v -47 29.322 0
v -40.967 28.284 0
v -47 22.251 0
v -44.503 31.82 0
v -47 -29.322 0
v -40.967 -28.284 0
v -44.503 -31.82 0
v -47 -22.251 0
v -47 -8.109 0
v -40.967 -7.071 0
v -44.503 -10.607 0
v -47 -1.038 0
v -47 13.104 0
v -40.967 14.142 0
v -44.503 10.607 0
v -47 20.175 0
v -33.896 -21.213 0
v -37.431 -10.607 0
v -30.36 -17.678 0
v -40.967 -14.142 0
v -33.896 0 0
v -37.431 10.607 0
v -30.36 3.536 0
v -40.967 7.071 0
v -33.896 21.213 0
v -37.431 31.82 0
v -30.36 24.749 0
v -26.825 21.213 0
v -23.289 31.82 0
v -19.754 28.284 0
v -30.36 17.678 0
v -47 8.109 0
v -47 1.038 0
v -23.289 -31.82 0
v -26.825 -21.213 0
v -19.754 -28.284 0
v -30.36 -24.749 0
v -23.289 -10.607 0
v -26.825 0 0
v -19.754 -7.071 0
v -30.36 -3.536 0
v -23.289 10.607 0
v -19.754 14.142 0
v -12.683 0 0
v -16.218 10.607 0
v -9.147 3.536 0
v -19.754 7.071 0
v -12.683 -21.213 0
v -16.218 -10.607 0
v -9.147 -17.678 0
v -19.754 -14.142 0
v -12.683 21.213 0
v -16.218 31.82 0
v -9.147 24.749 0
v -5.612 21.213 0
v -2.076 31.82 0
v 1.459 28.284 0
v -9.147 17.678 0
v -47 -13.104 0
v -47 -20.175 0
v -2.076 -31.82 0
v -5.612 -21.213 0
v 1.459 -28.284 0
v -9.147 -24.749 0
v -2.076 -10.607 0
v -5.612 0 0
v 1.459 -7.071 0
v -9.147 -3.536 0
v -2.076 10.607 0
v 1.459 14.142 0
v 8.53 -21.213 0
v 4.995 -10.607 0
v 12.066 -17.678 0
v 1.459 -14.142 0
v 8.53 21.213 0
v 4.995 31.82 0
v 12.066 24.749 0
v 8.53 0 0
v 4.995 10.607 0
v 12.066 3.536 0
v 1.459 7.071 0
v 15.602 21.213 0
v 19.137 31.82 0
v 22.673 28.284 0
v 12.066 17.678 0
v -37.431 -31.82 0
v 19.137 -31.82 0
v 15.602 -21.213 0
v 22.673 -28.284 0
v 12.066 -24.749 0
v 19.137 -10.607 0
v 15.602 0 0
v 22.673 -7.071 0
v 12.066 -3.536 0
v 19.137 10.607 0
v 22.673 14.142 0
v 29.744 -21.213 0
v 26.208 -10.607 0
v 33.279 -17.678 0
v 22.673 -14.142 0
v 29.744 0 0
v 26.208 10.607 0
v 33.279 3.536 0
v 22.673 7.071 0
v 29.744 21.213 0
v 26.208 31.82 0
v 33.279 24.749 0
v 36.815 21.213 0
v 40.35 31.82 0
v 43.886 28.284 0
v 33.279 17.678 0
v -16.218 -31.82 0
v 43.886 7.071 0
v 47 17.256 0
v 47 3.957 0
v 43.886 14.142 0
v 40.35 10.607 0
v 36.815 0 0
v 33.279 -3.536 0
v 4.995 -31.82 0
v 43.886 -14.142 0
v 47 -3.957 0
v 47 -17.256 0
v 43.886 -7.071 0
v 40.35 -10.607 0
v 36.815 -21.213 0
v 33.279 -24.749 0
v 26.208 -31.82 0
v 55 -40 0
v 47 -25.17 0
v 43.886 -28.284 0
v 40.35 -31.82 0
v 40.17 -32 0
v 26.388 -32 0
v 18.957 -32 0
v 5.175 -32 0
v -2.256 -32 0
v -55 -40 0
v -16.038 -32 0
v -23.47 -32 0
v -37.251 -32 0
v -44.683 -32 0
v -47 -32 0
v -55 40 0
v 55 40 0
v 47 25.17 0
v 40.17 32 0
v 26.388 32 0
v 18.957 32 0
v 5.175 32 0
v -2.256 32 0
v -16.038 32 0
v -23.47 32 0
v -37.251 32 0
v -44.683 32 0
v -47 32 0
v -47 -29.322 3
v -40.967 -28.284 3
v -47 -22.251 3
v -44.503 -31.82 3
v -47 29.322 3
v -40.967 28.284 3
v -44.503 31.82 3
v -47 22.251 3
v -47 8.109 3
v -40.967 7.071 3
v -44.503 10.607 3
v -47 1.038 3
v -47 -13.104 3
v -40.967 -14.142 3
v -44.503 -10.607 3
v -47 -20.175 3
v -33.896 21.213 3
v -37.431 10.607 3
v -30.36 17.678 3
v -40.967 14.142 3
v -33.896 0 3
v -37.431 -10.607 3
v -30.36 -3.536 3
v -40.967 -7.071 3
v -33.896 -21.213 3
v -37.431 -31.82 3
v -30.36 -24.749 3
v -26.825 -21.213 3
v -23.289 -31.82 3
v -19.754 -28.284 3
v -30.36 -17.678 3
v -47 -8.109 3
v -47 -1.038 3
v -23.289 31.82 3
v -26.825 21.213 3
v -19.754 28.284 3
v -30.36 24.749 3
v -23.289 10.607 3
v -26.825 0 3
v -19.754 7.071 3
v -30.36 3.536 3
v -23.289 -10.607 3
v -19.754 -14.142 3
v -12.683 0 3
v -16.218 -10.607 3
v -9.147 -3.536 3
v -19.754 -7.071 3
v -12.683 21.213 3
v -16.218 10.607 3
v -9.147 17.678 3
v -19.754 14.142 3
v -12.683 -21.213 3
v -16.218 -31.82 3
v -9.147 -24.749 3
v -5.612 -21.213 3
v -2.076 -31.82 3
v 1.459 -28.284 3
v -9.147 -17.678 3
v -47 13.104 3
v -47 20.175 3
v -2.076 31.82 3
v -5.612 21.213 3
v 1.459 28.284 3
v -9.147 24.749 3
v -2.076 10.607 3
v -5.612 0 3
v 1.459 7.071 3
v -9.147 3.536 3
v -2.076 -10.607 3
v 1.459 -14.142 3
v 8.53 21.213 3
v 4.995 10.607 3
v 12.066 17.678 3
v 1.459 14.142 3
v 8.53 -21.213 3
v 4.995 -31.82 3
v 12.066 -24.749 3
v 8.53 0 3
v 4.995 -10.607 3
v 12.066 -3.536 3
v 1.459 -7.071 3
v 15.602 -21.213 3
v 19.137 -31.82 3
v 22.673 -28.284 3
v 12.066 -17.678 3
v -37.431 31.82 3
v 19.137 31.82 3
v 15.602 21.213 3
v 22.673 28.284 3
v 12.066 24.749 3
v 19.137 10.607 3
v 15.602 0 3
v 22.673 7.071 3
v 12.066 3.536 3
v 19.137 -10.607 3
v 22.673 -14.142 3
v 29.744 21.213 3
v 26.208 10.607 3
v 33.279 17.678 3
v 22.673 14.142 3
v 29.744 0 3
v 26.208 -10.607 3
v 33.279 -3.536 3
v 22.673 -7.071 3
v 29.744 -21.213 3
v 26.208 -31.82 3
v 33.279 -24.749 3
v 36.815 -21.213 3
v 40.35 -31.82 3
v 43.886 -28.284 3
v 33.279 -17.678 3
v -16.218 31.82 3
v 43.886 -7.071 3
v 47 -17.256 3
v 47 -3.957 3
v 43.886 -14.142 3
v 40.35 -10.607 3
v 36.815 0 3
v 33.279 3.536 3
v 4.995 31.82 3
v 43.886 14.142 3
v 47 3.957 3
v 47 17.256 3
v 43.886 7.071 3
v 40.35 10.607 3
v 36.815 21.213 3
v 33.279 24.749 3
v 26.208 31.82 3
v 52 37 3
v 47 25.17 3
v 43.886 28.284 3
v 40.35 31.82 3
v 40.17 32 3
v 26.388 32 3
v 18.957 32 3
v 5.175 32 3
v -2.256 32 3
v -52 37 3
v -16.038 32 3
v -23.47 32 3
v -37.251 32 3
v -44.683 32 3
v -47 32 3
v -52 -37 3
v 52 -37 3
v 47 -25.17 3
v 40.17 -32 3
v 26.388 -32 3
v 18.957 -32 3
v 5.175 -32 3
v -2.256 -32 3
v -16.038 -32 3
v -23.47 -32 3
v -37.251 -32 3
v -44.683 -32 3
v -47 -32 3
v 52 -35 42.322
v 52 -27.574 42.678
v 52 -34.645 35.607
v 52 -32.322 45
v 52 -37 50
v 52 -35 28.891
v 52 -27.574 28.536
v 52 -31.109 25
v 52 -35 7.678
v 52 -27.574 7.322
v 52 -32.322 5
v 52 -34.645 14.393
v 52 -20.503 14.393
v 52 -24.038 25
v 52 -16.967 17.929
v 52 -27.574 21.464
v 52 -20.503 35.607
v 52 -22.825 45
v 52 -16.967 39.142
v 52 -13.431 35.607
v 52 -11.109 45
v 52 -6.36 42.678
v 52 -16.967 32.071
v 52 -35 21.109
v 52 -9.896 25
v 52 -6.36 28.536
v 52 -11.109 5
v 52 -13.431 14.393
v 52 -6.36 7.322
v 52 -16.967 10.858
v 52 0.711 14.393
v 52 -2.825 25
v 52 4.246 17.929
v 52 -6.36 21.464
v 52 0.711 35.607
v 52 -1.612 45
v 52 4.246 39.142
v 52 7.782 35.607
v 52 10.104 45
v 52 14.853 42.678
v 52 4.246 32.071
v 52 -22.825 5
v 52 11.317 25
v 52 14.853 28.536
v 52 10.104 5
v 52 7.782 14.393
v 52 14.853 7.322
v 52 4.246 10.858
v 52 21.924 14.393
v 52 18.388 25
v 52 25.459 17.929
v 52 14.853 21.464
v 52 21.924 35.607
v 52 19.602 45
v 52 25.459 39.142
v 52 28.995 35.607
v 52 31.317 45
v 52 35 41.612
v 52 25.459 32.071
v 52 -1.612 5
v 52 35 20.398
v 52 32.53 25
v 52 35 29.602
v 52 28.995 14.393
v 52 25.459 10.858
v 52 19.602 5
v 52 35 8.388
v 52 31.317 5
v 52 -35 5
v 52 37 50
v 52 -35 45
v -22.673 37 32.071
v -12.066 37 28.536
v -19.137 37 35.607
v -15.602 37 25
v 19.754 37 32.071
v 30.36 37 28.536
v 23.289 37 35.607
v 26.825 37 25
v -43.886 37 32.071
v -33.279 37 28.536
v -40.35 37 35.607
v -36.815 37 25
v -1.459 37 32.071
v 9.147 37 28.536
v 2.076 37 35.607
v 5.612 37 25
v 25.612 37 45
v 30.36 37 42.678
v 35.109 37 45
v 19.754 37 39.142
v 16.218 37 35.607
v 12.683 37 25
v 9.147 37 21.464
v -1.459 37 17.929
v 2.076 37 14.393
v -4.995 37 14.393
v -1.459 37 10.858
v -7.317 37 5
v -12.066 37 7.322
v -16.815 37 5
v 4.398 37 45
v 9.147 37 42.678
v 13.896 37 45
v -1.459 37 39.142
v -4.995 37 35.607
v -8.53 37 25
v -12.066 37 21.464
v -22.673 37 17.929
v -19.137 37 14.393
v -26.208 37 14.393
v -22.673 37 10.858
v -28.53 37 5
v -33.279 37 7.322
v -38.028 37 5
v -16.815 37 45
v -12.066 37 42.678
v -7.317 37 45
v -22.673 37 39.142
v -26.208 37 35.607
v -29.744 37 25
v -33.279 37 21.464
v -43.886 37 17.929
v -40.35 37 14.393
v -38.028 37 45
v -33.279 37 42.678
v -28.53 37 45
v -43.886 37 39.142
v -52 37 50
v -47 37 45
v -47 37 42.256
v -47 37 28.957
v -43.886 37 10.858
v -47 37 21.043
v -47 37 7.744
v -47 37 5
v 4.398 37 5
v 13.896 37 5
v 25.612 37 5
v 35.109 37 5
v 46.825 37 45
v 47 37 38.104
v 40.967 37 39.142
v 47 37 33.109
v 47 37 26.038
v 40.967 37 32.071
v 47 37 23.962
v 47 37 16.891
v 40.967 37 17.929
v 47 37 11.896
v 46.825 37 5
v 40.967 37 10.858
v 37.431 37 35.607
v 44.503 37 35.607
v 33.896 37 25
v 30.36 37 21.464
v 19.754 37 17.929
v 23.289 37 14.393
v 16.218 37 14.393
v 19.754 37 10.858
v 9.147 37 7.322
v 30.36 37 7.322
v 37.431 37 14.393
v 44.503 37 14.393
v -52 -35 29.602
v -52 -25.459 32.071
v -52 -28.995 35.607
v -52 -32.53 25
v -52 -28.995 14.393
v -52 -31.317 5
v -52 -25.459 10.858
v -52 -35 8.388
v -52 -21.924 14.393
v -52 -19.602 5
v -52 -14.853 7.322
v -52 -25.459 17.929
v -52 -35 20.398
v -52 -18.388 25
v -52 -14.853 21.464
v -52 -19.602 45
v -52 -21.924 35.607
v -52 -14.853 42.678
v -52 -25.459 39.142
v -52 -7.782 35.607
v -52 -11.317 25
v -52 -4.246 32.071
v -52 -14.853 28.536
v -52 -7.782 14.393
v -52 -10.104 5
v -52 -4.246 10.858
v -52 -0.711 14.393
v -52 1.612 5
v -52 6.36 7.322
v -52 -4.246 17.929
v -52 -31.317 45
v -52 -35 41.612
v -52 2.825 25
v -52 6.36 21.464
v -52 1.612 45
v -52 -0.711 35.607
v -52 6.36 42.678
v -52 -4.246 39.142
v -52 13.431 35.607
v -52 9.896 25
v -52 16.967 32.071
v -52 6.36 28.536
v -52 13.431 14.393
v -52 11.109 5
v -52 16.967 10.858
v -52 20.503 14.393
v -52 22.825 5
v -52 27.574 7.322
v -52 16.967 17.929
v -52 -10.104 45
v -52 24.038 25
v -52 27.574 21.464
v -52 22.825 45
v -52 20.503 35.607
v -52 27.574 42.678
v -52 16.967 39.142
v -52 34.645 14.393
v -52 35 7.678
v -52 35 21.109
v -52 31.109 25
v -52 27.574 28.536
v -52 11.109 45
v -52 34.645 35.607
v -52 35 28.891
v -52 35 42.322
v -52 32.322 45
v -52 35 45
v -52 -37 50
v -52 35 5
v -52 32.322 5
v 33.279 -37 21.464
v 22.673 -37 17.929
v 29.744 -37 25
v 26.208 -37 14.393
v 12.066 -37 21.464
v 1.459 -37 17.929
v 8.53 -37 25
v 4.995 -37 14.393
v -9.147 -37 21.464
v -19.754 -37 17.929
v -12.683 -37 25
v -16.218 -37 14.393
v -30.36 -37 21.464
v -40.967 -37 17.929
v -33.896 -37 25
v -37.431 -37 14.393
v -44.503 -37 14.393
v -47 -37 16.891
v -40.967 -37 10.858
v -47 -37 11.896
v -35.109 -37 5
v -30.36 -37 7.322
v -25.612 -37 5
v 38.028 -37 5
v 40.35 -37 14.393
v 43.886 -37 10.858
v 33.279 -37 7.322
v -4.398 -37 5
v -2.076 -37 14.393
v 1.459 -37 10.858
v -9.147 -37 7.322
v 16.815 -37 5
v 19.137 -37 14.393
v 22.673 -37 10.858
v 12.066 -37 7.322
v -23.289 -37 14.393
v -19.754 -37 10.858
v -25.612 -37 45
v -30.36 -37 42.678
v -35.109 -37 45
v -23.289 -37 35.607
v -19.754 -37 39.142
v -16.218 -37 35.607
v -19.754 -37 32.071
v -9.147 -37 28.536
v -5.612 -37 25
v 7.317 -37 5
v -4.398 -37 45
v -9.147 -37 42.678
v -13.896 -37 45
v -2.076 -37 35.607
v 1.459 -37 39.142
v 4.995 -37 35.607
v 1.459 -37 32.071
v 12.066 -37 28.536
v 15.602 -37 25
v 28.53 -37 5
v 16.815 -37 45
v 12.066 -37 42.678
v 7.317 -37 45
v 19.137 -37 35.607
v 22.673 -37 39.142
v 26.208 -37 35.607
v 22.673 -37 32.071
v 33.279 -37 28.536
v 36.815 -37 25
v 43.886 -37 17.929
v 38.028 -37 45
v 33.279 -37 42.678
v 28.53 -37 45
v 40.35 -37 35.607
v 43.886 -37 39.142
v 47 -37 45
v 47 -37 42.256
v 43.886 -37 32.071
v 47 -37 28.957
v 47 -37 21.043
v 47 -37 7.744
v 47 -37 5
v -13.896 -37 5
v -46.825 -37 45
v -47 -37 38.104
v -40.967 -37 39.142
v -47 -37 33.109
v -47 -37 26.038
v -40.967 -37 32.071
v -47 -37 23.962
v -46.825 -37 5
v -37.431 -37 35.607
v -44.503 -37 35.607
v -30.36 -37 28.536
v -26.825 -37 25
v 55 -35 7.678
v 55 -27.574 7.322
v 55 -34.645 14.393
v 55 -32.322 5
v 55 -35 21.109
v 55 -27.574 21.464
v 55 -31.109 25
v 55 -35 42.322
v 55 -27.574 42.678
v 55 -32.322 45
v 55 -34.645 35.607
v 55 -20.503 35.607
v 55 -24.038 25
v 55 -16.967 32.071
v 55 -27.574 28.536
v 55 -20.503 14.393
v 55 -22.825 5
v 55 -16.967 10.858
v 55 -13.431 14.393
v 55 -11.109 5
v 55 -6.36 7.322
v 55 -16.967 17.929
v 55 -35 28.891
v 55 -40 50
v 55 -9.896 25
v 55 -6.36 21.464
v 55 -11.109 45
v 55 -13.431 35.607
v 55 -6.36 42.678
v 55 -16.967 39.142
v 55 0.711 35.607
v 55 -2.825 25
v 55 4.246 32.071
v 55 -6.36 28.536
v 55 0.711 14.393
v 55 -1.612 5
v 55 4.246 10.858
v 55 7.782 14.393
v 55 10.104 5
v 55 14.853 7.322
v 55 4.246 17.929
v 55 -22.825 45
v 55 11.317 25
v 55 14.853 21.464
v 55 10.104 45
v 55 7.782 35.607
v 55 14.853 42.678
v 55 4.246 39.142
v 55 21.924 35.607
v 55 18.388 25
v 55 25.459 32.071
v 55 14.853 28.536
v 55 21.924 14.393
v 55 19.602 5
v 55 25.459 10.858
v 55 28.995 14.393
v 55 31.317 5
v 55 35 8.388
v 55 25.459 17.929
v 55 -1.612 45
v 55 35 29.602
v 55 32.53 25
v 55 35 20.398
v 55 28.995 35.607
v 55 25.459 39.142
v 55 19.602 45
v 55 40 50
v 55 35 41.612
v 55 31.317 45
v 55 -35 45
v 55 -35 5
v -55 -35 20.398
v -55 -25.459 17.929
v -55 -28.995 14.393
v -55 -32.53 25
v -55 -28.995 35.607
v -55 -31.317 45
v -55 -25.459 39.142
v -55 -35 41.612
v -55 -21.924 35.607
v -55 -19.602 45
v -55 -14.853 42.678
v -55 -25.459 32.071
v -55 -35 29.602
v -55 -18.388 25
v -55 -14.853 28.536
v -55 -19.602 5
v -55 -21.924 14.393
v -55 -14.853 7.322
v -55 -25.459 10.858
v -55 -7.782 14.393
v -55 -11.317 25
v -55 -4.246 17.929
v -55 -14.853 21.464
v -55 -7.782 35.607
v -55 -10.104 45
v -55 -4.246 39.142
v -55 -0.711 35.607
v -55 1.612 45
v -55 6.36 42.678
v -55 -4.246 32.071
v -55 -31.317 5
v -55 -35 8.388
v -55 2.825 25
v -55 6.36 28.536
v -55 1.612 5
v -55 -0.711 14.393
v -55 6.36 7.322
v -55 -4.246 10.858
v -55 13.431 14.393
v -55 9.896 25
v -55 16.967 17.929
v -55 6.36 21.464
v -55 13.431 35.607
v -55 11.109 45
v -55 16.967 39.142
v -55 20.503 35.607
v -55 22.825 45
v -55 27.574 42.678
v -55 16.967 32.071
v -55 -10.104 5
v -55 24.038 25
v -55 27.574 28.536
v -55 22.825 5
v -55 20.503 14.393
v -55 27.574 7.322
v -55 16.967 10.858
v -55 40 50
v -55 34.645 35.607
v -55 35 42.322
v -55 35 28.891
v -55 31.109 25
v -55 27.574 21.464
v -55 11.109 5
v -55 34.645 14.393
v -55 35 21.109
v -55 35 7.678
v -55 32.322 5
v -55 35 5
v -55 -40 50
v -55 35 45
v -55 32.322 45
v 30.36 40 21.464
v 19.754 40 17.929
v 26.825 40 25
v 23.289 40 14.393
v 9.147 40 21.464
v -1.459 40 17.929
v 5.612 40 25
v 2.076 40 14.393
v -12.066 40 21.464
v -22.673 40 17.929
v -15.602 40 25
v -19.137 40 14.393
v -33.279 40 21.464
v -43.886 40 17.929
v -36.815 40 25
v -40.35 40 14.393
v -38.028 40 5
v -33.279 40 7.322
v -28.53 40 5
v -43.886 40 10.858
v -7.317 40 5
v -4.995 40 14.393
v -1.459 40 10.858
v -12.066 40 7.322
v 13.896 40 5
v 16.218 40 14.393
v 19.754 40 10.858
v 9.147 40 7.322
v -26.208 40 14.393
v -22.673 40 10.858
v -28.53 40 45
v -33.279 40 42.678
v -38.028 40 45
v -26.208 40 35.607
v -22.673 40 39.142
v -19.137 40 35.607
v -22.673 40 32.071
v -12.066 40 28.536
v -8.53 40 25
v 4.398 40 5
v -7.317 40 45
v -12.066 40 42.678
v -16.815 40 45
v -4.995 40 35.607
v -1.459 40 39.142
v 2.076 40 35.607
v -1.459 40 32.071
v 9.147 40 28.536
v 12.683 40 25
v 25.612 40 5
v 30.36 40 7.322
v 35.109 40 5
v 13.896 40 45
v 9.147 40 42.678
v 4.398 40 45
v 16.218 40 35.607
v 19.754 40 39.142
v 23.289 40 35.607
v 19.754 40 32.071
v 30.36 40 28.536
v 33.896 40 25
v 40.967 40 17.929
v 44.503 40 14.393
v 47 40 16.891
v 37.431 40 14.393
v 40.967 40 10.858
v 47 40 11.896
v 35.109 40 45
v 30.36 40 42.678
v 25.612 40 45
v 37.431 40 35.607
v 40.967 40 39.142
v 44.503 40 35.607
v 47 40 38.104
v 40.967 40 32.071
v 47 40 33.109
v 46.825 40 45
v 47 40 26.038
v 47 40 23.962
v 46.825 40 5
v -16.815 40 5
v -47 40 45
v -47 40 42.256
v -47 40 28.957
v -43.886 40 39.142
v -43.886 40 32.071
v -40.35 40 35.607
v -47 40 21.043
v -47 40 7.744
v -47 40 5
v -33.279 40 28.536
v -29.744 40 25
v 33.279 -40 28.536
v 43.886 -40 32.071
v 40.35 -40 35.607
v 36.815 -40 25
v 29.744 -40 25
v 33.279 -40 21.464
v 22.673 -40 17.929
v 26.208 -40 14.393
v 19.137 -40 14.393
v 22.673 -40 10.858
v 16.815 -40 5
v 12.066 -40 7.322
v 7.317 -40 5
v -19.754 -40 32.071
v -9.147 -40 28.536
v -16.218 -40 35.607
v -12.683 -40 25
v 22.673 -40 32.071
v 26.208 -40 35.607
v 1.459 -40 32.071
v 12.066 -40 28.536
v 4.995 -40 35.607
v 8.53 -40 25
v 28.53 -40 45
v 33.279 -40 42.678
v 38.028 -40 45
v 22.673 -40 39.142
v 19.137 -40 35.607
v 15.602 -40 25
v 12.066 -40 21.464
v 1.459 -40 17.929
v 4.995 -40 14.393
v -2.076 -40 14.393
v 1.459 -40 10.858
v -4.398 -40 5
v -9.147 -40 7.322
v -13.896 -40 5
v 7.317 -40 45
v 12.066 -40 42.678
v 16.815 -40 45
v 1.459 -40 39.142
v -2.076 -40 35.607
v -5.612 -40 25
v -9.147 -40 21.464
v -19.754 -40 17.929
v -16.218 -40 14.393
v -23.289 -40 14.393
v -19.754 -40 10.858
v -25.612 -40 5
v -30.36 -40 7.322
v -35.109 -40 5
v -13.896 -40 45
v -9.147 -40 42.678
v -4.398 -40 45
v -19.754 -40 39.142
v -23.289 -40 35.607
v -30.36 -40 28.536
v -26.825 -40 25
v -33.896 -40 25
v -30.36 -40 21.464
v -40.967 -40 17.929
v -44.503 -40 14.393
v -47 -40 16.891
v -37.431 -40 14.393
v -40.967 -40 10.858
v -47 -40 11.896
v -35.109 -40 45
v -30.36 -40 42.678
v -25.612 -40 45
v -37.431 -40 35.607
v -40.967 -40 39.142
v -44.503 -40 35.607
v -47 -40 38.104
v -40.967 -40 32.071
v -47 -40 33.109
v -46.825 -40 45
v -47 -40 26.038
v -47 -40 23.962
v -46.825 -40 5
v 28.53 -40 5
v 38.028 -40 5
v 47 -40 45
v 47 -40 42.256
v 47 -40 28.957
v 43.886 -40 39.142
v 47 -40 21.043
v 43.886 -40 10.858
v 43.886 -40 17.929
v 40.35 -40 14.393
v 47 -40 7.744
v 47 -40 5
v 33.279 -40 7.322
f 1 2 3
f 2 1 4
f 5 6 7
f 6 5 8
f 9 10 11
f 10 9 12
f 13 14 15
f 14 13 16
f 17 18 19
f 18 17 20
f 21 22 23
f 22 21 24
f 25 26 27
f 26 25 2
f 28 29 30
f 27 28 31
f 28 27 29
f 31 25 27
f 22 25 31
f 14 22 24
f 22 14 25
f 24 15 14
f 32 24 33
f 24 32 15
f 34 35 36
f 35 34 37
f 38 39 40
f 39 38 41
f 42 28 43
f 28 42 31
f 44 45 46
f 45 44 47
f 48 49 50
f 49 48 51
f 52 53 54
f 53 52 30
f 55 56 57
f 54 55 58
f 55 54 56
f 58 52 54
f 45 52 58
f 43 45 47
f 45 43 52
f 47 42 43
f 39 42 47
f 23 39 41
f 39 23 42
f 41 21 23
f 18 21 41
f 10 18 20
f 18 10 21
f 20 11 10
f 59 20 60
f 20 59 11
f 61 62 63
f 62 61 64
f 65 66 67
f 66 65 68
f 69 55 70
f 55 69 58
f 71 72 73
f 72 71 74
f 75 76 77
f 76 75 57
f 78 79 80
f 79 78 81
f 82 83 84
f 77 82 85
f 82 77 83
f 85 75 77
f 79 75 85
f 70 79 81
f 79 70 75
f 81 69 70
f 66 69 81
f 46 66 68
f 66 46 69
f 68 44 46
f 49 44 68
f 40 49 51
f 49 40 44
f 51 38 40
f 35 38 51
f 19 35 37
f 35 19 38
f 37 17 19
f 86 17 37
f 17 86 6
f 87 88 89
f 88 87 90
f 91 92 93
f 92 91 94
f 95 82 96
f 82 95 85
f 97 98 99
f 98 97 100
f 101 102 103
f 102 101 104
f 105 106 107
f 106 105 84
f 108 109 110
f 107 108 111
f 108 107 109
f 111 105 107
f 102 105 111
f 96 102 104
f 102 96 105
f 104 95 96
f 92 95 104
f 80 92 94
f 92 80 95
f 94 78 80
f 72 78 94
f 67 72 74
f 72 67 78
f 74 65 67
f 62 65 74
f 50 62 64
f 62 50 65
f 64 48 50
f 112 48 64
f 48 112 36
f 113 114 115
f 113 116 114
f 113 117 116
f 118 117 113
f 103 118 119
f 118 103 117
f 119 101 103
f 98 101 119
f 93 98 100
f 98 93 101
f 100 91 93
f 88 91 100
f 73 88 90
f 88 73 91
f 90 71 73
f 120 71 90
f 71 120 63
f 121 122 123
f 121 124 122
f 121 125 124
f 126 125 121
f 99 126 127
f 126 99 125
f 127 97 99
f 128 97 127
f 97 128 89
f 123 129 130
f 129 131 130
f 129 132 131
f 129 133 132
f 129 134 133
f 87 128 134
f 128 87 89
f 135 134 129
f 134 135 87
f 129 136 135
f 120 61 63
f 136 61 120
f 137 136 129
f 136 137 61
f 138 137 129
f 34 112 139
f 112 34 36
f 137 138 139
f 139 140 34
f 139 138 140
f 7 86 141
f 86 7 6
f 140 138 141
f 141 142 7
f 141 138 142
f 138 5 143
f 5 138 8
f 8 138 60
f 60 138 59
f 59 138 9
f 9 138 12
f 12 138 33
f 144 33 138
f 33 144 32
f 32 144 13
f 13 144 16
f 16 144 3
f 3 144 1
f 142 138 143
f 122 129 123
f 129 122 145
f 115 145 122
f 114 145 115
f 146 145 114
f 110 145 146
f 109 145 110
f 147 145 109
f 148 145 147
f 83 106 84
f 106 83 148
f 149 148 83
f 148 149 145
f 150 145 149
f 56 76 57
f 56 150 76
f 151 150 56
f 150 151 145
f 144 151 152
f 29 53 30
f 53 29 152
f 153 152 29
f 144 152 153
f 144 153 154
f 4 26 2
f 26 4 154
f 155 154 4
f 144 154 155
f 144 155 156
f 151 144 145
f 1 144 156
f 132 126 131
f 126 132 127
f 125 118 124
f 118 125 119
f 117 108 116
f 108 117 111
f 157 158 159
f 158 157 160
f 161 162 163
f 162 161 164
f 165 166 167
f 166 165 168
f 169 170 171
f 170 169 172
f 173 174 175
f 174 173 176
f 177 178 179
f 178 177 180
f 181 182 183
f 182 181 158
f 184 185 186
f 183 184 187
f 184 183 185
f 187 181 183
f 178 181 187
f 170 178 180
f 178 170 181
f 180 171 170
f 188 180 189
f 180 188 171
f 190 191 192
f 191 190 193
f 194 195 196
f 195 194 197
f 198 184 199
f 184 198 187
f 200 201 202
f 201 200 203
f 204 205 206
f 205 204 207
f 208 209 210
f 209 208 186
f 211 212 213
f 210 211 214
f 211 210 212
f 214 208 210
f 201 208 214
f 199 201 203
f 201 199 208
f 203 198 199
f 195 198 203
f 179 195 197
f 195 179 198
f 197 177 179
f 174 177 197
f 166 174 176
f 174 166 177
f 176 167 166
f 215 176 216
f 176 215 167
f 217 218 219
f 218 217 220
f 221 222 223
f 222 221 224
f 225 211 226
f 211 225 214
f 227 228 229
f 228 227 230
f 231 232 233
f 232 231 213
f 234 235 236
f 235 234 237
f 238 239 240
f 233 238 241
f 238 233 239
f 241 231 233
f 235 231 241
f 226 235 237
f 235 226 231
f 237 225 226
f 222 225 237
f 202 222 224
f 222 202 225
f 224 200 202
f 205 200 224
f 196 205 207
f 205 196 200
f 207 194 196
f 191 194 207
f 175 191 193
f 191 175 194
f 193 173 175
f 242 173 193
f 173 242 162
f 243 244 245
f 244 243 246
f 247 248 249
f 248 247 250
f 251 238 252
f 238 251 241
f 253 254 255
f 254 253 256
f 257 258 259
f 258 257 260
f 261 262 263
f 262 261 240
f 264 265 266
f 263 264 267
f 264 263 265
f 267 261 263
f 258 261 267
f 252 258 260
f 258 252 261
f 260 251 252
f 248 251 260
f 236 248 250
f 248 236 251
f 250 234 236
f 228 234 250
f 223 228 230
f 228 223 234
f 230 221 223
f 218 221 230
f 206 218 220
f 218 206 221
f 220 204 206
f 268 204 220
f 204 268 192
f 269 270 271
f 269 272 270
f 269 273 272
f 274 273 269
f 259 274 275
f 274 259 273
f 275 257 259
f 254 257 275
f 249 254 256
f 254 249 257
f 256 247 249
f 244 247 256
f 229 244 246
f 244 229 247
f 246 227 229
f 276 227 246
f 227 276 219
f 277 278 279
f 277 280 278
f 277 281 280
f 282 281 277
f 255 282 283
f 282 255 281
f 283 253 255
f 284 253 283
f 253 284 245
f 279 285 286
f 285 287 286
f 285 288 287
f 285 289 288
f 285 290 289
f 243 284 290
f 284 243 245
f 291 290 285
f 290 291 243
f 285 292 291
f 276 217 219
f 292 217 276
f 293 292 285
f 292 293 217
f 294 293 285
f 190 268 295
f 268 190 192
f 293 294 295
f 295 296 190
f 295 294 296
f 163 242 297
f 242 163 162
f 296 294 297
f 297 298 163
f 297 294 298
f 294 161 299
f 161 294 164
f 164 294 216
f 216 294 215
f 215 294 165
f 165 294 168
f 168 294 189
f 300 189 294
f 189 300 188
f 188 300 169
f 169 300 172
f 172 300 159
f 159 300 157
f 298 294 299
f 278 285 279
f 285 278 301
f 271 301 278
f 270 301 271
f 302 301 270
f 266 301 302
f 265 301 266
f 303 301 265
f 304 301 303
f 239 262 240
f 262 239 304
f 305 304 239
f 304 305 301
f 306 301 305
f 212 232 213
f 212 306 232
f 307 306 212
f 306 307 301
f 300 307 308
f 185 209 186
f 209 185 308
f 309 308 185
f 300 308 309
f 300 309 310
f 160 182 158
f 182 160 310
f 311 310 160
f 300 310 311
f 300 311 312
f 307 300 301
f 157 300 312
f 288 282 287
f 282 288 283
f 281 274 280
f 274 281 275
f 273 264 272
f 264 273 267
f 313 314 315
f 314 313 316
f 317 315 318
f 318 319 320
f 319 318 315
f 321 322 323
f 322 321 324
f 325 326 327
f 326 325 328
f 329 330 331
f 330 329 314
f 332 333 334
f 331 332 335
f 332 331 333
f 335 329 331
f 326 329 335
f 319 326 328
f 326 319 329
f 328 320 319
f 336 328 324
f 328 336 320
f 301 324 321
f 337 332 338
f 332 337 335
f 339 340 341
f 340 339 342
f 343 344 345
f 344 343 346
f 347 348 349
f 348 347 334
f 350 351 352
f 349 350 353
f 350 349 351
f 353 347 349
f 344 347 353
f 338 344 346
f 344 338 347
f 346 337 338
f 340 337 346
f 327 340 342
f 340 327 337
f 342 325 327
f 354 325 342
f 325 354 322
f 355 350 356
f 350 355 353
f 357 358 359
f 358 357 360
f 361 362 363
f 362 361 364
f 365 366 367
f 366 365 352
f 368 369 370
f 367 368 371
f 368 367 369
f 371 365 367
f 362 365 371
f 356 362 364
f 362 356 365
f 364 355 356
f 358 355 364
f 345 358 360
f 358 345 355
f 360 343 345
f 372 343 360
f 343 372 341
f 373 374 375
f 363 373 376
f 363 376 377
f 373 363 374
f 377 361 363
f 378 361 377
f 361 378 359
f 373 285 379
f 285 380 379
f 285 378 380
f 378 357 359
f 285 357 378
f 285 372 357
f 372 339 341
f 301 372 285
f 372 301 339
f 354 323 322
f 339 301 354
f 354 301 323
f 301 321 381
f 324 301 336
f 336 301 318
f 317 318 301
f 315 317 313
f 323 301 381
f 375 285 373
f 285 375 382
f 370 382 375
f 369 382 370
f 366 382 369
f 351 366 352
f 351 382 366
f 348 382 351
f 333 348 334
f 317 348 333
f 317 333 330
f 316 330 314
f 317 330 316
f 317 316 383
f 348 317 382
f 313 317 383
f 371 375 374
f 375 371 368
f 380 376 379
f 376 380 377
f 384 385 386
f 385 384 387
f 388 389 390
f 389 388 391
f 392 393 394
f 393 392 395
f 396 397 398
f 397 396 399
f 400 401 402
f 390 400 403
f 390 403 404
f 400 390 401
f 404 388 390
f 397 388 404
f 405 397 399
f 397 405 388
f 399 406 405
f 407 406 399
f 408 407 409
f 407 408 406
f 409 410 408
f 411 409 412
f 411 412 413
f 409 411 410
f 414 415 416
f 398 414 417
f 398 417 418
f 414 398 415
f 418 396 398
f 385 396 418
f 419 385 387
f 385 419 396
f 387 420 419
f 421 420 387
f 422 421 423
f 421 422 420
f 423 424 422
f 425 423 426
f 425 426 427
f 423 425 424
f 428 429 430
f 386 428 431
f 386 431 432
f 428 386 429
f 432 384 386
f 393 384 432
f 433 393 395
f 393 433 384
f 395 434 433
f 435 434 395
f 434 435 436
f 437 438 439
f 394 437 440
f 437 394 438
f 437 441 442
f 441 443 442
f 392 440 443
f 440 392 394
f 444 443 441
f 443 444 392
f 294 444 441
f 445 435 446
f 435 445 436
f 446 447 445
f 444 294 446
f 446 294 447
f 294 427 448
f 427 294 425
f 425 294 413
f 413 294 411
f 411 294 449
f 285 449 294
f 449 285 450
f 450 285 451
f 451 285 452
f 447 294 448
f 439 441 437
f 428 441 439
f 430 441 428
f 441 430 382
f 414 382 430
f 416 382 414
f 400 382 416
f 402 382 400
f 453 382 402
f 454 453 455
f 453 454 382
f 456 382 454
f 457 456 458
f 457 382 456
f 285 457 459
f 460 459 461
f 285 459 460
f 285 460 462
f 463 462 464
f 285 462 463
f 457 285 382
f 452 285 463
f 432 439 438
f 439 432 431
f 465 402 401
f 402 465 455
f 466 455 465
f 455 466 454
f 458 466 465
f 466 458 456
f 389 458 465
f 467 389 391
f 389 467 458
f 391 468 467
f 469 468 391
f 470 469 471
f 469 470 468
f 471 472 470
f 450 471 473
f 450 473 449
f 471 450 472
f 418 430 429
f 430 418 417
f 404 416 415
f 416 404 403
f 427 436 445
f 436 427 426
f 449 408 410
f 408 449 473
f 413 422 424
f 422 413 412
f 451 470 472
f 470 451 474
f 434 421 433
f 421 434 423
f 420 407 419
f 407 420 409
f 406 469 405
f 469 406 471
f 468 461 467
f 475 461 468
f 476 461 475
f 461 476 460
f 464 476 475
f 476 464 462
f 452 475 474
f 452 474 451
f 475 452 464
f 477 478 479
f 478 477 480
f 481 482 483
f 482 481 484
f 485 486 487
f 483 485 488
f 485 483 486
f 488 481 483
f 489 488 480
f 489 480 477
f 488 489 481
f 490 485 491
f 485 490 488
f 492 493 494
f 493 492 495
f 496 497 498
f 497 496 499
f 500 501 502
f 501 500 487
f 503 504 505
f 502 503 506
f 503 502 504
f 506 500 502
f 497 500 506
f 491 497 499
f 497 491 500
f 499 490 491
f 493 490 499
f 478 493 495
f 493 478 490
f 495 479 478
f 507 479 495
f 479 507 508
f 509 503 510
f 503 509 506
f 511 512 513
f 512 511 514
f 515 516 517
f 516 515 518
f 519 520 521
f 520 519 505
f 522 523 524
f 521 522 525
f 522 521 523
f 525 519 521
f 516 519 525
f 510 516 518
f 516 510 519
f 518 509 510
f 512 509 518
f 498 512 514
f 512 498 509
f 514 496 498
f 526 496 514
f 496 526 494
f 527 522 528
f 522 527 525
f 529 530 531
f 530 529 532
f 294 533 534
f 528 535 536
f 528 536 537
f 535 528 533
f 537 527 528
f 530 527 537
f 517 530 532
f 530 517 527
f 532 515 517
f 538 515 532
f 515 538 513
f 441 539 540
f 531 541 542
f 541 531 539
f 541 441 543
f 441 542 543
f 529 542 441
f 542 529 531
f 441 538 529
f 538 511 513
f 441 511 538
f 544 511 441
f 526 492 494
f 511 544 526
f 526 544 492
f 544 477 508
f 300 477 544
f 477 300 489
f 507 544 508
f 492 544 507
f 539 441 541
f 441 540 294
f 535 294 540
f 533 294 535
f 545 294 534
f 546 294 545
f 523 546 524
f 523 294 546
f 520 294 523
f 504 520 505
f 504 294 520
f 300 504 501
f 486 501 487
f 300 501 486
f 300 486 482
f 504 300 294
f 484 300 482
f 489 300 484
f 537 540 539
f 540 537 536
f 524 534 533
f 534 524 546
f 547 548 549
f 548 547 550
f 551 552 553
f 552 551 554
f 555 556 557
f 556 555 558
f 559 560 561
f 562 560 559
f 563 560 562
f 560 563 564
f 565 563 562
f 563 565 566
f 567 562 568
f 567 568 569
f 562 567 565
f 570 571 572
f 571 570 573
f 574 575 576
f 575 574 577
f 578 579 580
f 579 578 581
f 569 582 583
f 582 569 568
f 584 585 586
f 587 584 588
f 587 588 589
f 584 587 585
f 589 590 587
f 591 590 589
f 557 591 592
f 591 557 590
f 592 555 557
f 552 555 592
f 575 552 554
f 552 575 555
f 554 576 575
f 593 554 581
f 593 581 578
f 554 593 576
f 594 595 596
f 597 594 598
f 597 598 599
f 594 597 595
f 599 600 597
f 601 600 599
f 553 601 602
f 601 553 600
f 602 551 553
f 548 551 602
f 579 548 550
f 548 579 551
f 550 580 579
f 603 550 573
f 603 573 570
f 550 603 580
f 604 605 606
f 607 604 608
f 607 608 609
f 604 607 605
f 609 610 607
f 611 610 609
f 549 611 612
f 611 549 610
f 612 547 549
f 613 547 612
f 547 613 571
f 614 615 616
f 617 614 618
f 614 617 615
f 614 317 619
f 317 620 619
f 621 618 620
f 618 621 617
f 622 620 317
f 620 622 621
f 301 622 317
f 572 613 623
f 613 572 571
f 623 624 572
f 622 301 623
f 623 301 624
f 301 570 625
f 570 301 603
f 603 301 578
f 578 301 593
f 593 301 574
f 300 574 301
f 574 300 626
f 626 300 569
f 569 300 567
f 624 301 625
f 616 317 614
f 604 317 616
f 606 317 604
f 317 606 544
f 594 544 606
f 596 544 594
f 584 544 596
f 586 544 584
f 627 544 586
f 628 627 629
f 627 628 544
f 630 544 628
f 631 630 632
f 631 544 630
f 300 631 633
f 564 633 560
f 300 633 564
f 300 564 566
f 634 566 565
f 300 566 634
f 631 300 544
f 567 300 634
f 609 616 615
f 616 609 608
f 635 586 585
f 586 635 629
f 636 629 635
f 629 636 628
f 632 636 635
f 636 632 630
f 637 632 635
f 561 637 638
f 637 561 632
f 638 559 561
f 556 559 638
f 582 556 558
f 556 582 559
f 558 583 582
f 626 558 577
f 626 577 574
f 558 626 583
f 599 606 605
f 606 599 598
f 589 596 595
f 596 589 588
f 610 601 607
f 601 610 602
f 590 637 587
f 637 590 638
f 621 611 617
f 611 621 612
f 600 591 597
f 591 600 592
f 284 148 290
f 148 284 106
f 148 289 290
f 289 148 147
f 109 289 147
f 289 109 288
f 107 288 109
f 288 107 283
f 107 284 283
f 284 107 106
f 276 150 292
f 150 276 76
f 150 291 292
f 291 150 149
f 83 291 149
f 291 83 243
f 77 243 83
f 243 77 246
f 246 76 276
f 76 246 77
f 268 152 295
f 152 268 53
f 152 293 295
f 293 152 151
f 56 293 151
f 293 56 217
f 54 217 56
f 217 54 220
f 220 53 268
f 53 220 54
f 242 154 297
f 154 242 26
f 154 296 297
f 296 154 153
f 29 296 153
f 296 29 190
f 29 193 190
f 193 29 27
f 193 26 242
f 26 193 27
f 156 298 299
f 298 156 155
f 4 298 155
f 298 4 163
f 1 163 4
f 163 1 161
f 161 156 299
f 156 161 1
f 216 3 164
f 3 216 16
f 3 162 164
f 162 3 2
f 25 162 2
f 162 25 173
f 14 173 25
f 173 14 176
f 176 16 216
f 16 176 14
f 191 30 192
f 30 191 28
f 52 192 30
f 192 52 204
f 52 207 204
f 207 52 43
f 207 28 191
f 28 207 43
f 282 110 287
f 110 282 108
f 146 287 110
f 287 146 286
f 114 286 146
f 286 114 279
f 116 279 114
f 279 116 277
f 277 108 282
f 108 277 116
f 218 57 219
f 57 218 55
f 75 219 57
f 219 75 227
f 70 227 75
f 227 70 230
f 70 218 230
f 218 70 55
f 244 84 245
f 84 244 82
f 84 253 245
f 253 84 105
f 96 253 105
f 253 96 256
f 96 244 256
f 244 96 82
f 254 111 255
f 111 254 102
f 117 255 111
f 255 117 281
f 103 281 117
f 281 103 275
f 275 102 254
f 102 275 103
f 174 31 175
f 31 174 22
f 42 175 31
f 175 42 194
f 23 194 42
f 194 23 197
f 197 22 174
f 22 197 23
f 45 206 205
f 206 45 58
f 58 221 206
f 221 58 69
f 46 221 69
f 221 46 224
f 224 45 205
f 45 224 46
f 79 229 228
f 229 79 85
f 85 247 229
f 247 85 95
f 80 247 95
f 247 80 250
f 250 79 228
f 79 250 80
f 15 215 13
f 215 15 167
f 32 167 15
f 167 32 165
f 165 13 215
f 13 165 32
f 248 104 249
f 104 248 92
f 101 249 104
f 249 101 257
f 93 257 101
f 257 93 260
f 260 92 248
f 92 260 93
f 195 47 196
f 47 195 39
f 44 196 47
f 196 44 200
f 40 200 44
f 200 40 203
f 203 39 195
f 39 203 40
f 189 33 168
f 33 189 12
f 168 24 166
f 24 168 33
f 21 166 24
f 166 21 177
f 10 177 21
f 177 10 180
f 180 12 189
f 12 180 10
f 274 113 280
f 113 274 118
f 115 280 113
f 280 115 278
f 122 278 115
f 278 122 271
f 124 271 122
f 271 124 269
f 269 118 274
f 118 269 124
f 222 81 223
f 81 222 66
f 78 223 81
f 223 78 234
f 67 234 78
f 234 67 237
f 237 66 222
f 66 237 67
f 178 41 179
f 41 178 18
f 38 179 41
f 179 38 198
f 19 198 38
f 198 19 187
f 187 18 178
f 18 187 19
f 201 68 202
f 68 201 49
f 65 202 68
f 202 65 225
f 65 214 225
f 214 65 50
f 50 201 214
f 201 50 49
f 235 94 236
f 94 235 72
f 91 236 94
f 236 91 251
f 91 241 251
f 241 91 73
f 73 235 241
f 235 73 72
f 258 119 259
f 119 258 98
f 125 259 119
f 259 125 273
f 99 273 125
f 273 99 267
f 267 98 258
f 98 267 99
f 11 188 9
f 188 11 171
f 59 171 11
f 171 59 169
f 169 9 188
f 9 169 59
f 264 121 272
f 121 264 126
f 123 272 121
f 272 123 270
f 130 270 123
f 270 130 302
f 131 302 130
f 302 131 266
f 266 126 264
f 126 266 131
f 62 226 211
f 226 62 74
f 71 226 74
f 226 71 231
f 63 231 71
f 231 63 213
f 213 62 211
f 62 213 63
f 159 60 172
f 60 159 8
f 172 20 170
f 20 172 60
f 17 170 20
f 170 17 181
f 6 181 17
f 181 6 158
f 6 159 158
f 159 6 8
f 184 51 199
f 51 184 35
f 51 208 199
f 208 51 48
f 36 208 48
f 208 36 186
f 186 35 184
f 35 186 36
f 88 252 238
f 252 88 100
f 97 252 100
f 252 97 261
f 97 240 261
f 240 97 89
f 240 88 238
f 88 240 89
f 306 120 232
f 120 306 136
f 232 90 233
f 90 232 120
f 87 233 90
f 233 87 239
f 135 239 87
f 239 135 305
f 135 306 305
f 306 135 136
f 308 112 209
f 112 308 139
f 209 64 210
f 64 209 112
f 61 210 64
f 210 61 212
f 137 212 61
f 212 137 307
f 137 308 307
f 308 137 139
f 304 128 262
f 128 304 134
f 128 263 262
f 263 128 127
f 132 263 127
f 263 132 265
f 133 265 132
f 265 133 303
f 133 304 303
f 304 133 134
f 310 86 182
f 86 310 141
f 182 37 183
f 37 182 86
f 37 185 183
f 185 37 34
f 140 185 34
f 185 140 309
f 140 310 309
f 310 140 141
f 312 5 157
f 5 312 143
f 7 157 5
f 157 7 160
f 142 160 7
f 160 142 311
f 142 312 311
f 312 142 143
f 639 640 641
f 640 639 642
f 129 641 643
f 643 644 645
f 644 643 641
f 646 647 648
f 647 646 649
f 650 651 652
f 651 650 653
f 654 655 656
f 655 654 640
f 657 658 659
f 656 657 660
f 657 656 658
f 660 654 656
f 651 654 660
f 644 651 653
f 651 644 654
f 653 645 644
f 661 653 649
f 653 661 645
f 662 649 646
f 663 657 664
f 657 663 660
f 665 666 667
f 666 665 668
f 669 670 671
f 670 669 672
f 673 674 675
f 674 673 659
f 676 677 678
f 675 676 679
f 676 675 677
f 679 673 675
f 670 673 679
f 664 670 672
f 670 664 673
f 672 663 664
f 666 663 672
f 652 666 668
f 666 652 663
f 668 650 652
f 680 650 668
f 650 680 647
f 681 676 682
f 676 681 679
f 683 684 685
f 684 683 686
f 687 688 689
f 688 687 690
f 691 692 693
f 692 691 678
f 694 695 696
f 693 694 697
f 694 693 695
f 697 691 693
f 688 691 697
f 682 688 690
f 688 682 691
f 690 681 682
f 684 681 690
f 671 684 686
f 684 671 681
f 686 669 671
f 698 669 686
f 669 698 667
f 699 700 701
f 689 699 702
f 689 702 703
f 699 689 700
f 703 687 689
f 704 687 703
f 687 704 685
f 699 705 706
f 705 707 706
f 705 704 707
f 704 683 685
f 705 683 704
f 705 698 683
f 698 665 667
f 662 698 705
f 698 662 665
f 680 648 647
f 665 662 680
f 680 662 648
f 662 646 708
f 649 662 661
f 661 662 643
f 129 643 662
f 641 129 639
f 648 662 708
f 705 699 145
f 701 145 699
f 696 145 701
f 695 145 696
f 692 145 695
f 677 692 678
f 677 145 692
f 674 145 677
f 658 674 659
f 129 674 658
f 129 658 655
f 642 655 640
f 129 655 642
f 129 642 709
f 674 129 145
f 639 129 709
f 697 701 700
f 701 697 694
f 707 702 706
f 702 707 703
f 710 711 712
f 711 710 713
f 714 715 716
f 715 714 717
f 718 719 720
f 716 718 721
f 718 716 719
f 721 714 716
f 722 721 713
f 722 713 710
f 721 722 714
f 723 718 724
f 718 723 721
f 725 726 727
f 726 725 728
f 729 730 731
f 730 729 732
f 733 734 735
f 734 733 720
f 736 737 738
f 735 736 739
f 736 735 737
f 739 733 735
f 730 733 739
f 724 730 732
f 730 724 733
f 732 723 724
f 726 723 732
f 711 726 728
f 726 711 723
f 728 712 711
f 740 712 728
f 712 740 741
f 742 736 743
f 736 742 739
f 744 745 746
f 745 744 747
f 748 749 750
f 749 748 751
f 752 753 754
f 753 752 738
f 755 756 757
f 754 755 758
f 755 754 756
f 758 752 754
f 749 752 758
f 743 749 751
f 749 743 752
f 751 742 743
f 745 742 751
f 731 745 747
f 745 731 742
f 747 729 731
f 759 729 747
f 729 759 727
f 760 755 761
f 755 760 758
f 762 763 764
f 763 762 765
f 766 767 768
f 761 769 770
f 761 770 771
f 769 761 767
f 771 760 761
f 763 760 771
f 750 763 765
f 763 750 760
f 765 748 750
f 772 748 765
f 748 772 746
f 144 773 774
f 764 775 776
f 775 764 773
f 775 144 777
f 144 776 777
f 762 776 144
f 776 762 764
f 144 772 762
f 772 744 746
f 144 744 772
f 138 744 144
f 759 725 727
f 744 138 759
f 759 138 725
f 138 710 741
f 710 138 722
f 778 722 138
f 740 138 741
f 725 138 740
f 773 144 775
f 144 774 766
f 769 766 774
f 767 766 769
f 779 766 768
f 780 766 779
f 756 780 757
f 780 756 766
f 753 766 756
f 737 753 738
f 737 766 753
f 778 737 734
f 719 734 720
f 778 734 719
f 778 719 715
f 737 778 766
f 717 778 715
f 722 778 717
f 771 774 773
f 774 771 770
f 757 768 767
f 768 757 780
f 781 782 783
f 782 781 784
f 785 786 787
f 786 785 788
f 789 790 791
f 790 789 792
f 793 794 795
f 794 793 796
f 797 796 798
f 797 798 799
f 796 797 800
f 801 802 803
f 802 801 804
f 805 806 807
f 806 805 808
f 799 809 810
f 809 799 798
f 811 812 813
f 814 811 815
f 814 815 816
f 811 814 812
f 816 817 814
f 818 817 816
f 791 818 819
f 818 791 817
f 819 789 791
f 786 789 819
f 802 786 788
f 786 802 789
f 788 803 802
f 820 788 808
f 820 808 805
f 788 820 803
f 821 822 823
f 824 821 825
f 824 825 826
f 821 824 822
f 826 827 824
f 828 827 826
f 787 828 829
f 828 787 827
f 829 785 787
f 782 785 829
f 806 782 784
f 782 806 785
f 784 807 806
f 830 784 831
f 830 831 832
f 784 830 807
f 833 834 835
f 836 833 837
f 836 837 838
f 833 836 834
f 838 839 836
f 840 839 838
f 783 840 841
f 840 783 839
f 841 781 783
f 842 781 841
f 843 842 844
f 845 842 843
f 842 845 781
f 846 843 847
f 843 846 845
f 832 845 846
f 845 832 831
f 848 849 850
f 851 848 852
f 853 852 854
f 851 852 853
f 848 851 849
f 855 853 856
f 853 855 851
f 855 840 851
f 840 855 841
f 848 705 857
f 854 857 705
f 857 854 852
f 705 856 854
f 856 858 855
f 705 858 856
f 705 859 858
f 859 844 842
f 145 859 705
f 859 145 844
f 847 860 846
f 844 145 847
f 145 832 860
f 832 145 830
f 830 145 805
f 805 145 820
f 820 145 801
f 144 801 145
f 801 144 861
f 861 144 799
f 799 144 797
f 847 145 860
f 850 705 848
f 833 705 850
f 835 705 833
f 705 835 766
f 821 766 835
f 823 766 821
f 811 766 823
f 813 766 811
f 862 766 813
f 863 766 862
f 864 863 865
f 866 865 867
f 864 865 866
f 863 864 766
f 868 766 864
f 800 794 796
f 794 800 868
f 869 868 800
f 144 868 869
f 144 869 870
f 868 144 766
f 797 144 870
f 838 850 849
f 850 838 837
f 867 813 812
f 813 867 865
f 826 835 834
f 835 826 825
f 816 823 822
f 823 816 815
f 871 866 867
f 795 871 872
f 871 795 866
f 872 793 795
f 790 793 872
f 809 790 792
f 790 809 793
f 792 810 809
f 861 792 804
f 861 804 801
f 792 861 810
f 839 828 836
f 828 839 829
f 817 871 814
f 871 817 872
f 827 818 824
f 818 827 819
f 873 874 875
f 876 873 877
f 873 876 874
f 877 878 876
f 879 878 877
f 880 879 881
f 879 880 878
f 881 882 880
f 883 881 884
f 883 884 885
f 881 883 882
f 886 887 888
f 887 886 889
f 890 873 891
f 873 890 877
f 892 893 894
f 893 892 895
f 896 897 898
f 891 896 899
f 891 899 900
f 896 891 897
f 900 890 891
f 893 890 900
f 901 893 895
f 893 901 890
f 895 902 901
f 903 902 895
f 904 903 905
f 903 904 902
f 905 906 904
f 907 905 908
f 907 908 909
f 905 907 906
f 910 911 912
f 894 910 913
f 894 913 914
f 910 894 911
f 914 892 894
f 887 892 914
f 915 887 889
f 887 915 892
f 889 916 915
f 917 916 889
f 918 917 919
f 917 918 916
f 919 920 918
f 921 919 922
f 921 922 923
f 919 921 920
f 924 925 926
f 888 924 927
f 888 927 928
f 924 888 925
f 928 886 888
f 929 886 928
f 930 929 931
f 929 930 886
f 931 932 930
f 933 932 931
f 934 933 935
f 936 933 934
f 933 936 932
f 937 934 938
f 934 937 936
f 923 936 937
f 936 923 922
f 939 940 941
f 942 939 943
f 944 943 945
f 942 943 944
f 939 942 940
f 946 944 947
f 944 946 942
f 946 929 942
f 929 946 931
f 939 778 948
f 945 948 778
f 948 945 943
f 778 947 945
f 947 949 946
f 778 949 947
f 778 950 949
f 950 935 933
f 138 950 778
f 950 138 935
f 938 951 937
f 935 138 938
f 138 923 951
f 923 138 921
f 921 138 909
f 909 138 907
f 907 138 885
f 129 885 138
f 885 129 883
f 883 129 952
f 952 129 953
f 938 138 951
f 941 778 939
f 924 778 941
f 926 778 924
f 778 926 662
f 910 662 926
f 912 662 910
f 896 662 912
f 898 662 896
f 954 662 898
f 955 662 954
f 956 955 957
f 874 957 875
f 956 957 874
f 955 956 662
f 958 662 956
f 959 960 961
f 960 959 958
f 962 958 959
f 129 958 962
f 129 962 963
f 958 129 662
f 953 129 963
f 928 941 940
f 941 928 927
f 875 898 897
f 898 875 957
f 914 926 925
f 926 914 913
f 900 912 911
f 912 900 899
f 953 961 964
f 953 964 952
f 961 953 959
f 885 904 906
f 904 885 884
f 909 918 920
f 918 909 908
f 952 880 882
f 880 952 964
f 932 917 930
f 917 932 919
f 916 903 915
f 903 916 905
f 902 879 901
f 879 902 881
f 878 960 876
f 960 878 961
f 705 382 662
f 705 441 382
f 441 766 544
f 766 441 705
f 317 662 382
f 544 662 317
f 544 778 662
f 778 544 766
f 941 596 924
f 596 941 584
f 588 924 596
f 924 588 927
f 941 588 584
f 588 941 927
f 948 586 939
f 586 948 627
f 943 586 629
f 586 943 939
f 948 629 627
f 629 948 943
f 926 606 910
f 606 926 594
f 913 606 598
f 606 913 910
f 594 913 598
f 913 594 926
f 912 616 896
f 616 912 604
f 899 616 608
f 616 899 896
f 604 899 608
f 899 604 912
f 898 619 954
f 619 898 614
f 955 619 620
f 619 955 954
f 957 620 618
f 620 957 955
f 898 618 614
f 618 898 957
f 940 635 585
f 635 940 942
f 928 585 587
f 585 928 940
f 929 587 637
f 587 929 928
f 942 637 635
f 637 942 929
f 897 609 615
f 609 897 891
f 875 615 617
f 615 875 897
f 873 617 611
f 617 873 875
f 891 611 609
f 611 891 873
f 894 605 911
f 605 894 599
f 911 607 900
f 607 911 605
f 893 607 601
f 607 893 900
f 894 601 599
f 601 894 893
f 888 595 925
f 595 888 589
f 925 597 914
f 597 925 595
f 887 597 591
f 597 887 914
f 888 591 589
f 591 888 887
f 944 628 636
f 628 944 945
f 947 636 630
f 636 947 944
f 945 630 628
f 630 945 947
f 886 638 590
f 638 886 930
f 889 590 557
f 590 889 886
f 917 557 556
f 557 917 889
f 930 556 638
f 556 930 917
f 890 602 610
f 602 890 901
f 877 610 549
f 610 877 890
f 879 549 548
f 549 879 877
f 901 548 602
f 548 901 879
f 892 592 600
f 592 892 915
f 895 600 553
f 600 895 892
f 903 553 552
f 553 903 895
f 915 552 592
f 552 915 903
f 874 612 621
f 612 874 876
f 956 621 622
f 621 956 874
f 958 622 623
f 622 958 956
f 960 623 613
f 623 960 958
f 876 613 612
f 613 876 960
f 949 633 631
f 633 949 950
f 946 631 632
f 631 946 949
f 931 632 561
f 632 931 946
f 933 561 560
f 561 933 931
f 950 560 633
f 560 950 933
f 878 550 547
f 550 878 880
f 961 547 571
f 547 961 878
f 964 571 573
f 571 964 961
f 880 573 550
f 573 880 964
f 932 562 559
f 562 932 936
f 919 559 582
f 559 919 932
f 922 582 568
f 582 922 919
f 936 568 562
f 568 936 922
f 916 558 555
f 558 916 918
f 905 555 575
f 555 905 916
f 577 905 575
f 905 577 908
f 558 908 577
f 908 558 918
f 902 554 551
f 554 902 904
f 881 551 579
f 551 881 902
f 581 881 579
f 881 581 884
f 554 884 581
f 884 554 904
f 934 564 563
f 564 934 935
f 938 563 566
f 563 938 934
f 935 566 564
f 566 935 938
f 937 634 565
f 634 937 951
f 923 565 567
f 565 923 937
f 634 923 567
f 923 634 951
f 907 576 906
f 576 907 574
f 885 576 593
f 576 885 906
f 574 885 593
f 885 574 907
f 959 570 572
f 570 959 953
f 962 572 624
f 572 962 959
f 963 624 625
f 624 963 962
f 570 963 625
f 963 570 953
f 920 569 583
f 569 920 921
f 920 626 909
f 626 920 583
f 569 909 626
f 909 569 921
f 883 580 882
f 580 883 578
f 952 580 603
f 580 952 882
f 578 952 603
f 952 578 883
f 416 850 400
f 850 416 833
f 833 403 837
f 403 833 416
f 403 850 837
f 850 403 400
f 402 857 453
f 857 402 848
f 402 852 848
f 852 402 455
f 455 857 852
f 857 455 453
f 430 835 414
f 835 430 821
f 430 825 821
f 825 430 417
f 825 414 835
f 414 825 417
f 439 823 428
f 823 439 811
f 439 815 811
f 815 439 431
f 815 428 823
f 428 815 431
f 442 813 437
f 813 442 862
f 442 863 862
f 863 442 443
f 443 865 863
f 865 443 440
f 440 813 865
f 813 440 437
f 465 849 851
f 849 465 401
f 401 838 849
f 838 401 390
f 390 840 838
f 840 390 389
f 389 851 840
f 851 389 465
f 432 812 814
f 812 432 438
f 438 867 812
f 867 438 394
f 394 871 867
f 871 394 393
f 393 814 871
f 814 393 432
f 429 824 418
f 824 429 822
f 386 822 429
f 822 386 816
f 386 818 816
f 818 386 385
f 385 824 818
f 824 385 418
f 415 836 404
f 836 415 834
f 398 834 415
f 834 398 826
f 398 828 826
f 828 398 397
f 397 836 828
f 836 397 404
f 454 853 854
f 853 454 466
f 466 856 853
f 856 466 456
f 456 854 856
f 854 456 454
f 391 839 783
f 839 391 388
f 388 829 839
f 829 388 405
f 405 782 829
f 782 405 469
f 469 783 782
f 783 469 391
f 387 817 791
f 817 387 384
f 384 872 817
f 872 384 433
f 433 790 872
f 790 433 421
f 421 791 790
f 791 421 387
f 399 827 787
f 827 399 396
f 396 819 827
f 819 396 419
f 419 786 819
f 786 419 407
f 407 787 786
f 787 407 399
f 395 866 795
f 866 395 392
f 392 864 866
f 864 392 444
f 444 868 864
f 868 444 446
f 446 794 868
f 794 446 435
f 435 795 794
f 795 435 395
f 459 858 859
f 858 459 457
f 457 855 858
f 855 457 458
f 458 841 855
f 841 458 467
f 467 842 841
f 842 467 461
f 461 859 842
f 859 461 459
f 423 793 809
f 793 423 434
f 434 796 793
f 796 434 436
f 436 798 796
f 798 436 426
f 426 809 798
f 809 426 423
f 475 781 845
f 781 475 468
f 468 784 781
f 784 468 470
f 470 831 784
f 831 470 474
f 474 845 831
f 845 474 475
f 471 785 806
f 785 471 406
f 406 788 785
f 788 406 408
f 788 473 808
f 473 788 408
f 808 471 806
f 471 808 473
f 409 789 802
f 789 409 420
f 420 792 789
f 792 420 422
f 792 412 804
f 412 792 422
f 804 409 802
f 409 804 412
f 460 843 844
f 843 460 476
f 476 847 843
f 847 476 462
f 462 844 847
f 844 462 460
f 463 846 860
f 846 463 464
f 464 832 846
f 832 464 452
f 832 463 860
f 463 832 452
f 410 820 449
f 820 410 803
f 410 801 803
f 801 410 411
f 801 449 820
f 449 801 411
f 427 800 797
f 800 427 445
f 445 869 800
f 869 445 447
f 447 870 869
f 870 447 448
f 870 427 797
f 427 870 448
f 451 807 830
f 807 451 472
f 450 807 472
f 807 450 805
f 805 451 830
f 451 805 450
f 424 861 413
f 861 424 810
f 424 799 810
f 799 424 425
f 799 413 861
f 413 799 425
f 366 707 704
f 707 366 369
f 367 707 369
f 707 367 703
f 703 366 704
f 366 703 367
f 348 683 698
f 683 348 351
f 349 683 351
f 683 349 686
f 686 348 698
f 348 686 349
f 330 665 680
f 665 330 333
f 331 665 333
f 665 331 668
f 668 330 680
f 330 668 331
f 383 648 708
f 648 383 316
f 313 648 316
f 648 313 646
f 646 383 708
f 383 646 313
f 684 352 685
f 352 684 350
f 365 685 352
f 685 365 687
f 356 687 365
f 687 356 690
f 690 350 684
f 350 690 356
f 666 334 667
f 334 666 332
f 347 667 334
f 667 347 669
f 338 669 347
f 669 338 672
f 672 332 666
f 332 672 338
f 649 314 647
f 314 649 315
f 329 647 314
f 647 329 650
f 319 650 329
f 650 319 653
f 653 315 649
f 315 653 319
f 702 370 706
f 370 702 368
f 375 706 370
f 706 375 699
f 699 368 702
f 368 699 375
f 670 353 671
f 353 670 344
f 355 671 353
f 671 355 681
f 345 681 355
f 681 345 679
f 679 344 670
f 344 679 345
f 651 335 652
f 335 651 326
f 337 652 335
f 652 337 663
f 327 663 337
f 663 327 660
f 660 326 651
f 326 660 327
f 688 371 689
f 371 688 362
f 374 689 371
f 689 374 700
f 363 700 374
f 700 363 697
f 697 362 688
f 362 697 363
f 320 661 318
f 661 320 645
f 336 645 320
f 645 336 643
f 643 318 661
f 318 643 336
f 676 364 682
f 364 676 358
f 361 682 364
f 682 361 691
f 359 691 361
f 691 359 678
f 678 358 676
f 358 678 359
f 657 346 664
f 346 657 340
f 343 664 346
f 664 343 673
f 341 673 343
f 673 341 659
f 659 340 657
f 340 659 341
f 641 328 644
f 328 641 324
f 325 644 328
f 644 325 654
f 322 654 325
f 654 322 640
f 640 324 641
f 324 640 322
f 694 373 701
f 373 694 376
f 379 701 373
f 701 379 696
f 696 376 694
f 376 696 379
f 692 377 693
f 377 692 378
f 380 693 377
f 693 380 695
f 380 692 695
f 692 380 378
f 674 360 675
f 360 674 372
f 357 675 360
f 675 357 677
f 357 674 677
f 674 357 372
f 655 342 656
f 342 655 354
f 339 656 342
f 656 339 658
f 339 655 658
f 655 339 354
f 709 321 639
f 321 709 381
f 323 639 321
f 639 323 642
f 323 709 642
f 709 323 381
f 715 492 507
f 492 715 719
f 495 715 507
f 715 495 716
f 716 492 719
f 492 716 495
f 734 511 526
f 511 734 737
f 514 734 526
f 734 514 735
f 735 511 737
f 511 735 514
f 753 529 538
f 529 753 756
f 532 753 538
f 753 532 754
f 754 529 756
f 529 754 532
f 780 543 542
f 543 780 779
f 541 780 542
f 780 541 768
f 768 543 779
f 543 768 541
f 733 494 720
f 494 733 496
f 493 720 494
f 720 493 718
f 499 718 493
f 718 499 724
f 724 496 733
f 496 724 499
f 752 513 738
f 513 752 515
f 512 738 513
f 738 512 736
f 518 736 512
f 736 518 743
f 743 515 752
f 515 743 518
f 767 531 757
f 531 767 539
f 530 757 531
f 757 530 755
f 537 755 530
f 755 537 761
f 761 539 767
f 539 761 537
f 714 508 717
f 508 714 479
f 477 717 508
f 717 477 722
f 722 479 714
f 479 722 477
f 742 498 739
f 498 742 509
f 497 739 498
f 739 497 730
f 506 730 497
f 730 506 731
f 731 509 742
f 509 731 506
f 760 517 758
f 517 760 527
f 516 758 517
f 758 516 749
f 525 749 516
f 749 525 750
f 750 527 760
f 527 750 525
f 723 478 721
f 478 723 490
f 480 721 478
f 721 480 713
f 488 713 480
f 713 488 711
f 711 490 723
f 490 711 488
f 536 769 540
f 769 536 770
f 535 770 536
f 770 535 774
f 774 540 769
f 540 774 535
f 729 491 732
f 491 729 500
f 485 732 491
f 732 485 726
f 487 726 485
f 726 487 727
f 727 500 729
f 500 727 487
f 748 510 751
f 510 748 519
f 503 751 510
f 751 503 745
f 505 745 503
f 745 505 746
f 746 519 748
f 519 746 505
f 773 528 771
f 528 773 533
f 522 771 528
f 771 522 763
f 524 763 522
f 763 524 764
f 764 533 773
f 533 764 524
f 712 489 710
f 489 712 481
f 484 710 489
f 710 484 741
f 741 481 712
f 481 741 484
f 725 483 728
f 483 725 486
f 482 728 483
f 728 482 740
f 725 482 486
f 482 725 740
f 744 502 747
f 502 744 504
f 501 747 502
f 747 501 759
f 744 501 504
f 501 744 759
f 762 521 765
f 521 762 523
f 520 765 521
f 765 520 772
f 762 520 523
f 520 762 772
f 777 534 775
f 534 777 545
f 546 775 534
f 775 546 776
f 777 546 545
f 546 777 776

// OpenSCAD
module mesh(x=0, y=0, interval=0, bone=0) {
    longer_edge = x > y ? x : y;
    intersection() {
        square(size=[x+2*bone, y+2*bone], center=true);
        union() {
            for (i = [0: (interval+bone)*2*cos(45): 2*x]) {
                translate([i-x, 0, 0]) {
                    rotate([0, 0, 45]) {
                        square(size=[bone, longer_edge*1.5], center=true);
                    }
                    rotate([0, 0, -45]) {
                        square(size=[bone, longer_edge*1.5], center=true);
                    }
                }
            }
            translate([x/2+bone/2, 0, 0]) {
                square(size=[bone, y+bone*2], center=true);
            }
            translate([-(x/2+bone/2), 0, 0]) {
                square(size=[bone, y+bone*2], center=true);
            }
            translate([0, y/2+bone/2, 0]) {
                square(size=[x, bone], center=true);
            }
            translate([0, -(y/2+bone/2), 0]) {
                square(size=[x, bone], center=true);
            }
        }
    }
}

module mesh3d(height=0, x=0, y=0, interval=0, bone=0) {
    linear_extrude(height=height) {
        mesh(x=x, y=y, interval=interval, bone=bone);
    }
}

module knob() {
    linear_extrude(height=3) {
        polygon(points=[
                [0,-3],
                [3,-5],
                [3,5],
                [0,3]
            ], 
            paths=[
                [0, 1, 2, 3]
            ]
        );
    }
}


// 底面
union() {
    mesh3d(height=3, x=94, y=64, interval=10, bone=5);
    translate([52, 0, 0]) {
        rotate([0, 0, 0]) {
            knob();
        }
    }
    translate([-52, 0, 0]) {
        rotate([0, 0, 180]) {
            knob();
        }
    }
    translate([0, 37, 0]) {
        rotate([0, 0, 90]) {
            knob();
        }
    }
    translate([0, -37, 0]) {
        rotate([0, 0, 270]) {
            knob();
        }
    }
}

// y軸手前
translate([0, -37, 25]) {
    rotate([90, 0, 0]) {
        union() {
            difference() {
                mesh3d(height=3, x=94, y=40, interval=10, bone=5);
                translate([0, -22, 0]) {
                    rotate([0, 270, 90]) {
                        knob();
                    }
                }
            }
            translate([52, 0, 0]) {
                rotate([0, 0, 0]) {
                    knob();
                }
            }
            translate([-52, 0, 0]) {
                rotate([0, 0, 180]) {
                    knob();
                }
            }
        }
    }
}
// y軸奥
translate([0, 37, 25]) {
    rotate([90, 0, 180]) {
        union() {
            difference() {
                mesh3d(height=3, x=94, y=40, interval=10, bone=5);
                translate([0, -22, 0]) {
                    rotate([0, 270, 90]) {
                        knob();
                    }
                }
            }
            translate([52, 0, 0]) {
                rotate([0, 0, 0]) {
                    knob();
                }
            }
            translate([-52, 0, 0]) {
                rotate([0, 0, 180]) {
                    knob();
                }
            }
        }
    }
}

// ｘ軸手前
translate([52, 0, 25]) {
    rotate([90, 0, 90]) {
        difference() {
            mesh3d(height=3, x=70, y=40, interval=10, bone=5);
            translate([0, -22, 0]) {
                rotate([0, 270, 90]) {
                    knob();
                }
            }
            translate([40, 0, 0]) {
                rotate([0, 270, 0]) {
                    knob();
                }
            }
            translate([-40, 0, 0]) {
                rotate([0, 270, 180]) {
                    knob();
                }
            }
        }
    }
}
// x軸奥
translate([-52, 0, 25]) {
    rotate([90, 0, 270]) {
        difference() {
            mesh3d(height=3, x=70, y=40, interval=10, bone=5);
            translate([0, -22, 0]) {
                rotate([0, 270, 90]) {
                    knob();
                }
            }
            translate([40, 0, 0]) {
                rotate([0, 270, 0]) {
                    knob();
                }
            }
            translate([-40, 0, 0]) {
                rotate([0, 270, 180]) {
                    knob();
                }
            }
        }
    }
}
